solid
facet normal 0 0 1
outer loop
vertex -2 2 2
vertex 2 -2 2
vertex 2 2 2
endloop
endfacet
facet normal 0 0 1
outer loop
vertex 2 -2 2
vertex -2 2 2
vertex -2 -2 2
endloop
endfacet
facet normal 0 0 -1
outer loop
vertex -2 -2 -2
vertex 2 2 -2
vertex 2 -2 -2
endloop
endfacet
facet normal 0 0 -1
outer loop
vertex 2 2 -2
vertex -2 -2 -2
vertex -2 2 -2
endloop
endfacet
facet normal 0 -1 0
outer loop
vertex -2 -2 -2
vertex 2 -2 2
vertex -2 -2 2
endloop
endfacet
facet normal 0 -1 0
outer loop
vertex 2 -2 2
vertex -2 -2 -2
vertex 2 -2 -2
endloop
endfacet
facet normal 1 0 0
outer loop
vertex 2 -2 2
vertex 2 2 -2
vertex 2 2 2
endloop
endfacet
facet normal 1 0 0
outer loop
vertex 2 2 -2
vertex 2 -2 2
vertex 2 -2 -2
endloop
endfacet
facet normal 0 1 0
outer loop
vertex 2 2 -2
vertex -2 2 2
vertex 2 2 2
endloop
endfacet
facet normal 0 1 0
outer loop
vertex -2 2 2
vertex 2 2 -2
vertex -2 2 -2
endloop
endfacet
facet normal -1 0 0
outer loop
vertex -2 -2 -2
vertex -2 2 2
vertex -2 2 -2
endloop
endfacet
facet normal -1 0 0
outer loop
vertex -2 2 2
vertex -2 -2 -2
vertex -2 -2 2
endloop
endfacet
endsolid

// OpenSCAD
// Generated by Mecha (https://github.com/tomahawkins/mecha)

color([0.5, 0.5, 0.5, 1.0]) translate ([-2.0, -2.0, -2.0]) cube(size = [4.0, 4.0, 4.0], center = false);
